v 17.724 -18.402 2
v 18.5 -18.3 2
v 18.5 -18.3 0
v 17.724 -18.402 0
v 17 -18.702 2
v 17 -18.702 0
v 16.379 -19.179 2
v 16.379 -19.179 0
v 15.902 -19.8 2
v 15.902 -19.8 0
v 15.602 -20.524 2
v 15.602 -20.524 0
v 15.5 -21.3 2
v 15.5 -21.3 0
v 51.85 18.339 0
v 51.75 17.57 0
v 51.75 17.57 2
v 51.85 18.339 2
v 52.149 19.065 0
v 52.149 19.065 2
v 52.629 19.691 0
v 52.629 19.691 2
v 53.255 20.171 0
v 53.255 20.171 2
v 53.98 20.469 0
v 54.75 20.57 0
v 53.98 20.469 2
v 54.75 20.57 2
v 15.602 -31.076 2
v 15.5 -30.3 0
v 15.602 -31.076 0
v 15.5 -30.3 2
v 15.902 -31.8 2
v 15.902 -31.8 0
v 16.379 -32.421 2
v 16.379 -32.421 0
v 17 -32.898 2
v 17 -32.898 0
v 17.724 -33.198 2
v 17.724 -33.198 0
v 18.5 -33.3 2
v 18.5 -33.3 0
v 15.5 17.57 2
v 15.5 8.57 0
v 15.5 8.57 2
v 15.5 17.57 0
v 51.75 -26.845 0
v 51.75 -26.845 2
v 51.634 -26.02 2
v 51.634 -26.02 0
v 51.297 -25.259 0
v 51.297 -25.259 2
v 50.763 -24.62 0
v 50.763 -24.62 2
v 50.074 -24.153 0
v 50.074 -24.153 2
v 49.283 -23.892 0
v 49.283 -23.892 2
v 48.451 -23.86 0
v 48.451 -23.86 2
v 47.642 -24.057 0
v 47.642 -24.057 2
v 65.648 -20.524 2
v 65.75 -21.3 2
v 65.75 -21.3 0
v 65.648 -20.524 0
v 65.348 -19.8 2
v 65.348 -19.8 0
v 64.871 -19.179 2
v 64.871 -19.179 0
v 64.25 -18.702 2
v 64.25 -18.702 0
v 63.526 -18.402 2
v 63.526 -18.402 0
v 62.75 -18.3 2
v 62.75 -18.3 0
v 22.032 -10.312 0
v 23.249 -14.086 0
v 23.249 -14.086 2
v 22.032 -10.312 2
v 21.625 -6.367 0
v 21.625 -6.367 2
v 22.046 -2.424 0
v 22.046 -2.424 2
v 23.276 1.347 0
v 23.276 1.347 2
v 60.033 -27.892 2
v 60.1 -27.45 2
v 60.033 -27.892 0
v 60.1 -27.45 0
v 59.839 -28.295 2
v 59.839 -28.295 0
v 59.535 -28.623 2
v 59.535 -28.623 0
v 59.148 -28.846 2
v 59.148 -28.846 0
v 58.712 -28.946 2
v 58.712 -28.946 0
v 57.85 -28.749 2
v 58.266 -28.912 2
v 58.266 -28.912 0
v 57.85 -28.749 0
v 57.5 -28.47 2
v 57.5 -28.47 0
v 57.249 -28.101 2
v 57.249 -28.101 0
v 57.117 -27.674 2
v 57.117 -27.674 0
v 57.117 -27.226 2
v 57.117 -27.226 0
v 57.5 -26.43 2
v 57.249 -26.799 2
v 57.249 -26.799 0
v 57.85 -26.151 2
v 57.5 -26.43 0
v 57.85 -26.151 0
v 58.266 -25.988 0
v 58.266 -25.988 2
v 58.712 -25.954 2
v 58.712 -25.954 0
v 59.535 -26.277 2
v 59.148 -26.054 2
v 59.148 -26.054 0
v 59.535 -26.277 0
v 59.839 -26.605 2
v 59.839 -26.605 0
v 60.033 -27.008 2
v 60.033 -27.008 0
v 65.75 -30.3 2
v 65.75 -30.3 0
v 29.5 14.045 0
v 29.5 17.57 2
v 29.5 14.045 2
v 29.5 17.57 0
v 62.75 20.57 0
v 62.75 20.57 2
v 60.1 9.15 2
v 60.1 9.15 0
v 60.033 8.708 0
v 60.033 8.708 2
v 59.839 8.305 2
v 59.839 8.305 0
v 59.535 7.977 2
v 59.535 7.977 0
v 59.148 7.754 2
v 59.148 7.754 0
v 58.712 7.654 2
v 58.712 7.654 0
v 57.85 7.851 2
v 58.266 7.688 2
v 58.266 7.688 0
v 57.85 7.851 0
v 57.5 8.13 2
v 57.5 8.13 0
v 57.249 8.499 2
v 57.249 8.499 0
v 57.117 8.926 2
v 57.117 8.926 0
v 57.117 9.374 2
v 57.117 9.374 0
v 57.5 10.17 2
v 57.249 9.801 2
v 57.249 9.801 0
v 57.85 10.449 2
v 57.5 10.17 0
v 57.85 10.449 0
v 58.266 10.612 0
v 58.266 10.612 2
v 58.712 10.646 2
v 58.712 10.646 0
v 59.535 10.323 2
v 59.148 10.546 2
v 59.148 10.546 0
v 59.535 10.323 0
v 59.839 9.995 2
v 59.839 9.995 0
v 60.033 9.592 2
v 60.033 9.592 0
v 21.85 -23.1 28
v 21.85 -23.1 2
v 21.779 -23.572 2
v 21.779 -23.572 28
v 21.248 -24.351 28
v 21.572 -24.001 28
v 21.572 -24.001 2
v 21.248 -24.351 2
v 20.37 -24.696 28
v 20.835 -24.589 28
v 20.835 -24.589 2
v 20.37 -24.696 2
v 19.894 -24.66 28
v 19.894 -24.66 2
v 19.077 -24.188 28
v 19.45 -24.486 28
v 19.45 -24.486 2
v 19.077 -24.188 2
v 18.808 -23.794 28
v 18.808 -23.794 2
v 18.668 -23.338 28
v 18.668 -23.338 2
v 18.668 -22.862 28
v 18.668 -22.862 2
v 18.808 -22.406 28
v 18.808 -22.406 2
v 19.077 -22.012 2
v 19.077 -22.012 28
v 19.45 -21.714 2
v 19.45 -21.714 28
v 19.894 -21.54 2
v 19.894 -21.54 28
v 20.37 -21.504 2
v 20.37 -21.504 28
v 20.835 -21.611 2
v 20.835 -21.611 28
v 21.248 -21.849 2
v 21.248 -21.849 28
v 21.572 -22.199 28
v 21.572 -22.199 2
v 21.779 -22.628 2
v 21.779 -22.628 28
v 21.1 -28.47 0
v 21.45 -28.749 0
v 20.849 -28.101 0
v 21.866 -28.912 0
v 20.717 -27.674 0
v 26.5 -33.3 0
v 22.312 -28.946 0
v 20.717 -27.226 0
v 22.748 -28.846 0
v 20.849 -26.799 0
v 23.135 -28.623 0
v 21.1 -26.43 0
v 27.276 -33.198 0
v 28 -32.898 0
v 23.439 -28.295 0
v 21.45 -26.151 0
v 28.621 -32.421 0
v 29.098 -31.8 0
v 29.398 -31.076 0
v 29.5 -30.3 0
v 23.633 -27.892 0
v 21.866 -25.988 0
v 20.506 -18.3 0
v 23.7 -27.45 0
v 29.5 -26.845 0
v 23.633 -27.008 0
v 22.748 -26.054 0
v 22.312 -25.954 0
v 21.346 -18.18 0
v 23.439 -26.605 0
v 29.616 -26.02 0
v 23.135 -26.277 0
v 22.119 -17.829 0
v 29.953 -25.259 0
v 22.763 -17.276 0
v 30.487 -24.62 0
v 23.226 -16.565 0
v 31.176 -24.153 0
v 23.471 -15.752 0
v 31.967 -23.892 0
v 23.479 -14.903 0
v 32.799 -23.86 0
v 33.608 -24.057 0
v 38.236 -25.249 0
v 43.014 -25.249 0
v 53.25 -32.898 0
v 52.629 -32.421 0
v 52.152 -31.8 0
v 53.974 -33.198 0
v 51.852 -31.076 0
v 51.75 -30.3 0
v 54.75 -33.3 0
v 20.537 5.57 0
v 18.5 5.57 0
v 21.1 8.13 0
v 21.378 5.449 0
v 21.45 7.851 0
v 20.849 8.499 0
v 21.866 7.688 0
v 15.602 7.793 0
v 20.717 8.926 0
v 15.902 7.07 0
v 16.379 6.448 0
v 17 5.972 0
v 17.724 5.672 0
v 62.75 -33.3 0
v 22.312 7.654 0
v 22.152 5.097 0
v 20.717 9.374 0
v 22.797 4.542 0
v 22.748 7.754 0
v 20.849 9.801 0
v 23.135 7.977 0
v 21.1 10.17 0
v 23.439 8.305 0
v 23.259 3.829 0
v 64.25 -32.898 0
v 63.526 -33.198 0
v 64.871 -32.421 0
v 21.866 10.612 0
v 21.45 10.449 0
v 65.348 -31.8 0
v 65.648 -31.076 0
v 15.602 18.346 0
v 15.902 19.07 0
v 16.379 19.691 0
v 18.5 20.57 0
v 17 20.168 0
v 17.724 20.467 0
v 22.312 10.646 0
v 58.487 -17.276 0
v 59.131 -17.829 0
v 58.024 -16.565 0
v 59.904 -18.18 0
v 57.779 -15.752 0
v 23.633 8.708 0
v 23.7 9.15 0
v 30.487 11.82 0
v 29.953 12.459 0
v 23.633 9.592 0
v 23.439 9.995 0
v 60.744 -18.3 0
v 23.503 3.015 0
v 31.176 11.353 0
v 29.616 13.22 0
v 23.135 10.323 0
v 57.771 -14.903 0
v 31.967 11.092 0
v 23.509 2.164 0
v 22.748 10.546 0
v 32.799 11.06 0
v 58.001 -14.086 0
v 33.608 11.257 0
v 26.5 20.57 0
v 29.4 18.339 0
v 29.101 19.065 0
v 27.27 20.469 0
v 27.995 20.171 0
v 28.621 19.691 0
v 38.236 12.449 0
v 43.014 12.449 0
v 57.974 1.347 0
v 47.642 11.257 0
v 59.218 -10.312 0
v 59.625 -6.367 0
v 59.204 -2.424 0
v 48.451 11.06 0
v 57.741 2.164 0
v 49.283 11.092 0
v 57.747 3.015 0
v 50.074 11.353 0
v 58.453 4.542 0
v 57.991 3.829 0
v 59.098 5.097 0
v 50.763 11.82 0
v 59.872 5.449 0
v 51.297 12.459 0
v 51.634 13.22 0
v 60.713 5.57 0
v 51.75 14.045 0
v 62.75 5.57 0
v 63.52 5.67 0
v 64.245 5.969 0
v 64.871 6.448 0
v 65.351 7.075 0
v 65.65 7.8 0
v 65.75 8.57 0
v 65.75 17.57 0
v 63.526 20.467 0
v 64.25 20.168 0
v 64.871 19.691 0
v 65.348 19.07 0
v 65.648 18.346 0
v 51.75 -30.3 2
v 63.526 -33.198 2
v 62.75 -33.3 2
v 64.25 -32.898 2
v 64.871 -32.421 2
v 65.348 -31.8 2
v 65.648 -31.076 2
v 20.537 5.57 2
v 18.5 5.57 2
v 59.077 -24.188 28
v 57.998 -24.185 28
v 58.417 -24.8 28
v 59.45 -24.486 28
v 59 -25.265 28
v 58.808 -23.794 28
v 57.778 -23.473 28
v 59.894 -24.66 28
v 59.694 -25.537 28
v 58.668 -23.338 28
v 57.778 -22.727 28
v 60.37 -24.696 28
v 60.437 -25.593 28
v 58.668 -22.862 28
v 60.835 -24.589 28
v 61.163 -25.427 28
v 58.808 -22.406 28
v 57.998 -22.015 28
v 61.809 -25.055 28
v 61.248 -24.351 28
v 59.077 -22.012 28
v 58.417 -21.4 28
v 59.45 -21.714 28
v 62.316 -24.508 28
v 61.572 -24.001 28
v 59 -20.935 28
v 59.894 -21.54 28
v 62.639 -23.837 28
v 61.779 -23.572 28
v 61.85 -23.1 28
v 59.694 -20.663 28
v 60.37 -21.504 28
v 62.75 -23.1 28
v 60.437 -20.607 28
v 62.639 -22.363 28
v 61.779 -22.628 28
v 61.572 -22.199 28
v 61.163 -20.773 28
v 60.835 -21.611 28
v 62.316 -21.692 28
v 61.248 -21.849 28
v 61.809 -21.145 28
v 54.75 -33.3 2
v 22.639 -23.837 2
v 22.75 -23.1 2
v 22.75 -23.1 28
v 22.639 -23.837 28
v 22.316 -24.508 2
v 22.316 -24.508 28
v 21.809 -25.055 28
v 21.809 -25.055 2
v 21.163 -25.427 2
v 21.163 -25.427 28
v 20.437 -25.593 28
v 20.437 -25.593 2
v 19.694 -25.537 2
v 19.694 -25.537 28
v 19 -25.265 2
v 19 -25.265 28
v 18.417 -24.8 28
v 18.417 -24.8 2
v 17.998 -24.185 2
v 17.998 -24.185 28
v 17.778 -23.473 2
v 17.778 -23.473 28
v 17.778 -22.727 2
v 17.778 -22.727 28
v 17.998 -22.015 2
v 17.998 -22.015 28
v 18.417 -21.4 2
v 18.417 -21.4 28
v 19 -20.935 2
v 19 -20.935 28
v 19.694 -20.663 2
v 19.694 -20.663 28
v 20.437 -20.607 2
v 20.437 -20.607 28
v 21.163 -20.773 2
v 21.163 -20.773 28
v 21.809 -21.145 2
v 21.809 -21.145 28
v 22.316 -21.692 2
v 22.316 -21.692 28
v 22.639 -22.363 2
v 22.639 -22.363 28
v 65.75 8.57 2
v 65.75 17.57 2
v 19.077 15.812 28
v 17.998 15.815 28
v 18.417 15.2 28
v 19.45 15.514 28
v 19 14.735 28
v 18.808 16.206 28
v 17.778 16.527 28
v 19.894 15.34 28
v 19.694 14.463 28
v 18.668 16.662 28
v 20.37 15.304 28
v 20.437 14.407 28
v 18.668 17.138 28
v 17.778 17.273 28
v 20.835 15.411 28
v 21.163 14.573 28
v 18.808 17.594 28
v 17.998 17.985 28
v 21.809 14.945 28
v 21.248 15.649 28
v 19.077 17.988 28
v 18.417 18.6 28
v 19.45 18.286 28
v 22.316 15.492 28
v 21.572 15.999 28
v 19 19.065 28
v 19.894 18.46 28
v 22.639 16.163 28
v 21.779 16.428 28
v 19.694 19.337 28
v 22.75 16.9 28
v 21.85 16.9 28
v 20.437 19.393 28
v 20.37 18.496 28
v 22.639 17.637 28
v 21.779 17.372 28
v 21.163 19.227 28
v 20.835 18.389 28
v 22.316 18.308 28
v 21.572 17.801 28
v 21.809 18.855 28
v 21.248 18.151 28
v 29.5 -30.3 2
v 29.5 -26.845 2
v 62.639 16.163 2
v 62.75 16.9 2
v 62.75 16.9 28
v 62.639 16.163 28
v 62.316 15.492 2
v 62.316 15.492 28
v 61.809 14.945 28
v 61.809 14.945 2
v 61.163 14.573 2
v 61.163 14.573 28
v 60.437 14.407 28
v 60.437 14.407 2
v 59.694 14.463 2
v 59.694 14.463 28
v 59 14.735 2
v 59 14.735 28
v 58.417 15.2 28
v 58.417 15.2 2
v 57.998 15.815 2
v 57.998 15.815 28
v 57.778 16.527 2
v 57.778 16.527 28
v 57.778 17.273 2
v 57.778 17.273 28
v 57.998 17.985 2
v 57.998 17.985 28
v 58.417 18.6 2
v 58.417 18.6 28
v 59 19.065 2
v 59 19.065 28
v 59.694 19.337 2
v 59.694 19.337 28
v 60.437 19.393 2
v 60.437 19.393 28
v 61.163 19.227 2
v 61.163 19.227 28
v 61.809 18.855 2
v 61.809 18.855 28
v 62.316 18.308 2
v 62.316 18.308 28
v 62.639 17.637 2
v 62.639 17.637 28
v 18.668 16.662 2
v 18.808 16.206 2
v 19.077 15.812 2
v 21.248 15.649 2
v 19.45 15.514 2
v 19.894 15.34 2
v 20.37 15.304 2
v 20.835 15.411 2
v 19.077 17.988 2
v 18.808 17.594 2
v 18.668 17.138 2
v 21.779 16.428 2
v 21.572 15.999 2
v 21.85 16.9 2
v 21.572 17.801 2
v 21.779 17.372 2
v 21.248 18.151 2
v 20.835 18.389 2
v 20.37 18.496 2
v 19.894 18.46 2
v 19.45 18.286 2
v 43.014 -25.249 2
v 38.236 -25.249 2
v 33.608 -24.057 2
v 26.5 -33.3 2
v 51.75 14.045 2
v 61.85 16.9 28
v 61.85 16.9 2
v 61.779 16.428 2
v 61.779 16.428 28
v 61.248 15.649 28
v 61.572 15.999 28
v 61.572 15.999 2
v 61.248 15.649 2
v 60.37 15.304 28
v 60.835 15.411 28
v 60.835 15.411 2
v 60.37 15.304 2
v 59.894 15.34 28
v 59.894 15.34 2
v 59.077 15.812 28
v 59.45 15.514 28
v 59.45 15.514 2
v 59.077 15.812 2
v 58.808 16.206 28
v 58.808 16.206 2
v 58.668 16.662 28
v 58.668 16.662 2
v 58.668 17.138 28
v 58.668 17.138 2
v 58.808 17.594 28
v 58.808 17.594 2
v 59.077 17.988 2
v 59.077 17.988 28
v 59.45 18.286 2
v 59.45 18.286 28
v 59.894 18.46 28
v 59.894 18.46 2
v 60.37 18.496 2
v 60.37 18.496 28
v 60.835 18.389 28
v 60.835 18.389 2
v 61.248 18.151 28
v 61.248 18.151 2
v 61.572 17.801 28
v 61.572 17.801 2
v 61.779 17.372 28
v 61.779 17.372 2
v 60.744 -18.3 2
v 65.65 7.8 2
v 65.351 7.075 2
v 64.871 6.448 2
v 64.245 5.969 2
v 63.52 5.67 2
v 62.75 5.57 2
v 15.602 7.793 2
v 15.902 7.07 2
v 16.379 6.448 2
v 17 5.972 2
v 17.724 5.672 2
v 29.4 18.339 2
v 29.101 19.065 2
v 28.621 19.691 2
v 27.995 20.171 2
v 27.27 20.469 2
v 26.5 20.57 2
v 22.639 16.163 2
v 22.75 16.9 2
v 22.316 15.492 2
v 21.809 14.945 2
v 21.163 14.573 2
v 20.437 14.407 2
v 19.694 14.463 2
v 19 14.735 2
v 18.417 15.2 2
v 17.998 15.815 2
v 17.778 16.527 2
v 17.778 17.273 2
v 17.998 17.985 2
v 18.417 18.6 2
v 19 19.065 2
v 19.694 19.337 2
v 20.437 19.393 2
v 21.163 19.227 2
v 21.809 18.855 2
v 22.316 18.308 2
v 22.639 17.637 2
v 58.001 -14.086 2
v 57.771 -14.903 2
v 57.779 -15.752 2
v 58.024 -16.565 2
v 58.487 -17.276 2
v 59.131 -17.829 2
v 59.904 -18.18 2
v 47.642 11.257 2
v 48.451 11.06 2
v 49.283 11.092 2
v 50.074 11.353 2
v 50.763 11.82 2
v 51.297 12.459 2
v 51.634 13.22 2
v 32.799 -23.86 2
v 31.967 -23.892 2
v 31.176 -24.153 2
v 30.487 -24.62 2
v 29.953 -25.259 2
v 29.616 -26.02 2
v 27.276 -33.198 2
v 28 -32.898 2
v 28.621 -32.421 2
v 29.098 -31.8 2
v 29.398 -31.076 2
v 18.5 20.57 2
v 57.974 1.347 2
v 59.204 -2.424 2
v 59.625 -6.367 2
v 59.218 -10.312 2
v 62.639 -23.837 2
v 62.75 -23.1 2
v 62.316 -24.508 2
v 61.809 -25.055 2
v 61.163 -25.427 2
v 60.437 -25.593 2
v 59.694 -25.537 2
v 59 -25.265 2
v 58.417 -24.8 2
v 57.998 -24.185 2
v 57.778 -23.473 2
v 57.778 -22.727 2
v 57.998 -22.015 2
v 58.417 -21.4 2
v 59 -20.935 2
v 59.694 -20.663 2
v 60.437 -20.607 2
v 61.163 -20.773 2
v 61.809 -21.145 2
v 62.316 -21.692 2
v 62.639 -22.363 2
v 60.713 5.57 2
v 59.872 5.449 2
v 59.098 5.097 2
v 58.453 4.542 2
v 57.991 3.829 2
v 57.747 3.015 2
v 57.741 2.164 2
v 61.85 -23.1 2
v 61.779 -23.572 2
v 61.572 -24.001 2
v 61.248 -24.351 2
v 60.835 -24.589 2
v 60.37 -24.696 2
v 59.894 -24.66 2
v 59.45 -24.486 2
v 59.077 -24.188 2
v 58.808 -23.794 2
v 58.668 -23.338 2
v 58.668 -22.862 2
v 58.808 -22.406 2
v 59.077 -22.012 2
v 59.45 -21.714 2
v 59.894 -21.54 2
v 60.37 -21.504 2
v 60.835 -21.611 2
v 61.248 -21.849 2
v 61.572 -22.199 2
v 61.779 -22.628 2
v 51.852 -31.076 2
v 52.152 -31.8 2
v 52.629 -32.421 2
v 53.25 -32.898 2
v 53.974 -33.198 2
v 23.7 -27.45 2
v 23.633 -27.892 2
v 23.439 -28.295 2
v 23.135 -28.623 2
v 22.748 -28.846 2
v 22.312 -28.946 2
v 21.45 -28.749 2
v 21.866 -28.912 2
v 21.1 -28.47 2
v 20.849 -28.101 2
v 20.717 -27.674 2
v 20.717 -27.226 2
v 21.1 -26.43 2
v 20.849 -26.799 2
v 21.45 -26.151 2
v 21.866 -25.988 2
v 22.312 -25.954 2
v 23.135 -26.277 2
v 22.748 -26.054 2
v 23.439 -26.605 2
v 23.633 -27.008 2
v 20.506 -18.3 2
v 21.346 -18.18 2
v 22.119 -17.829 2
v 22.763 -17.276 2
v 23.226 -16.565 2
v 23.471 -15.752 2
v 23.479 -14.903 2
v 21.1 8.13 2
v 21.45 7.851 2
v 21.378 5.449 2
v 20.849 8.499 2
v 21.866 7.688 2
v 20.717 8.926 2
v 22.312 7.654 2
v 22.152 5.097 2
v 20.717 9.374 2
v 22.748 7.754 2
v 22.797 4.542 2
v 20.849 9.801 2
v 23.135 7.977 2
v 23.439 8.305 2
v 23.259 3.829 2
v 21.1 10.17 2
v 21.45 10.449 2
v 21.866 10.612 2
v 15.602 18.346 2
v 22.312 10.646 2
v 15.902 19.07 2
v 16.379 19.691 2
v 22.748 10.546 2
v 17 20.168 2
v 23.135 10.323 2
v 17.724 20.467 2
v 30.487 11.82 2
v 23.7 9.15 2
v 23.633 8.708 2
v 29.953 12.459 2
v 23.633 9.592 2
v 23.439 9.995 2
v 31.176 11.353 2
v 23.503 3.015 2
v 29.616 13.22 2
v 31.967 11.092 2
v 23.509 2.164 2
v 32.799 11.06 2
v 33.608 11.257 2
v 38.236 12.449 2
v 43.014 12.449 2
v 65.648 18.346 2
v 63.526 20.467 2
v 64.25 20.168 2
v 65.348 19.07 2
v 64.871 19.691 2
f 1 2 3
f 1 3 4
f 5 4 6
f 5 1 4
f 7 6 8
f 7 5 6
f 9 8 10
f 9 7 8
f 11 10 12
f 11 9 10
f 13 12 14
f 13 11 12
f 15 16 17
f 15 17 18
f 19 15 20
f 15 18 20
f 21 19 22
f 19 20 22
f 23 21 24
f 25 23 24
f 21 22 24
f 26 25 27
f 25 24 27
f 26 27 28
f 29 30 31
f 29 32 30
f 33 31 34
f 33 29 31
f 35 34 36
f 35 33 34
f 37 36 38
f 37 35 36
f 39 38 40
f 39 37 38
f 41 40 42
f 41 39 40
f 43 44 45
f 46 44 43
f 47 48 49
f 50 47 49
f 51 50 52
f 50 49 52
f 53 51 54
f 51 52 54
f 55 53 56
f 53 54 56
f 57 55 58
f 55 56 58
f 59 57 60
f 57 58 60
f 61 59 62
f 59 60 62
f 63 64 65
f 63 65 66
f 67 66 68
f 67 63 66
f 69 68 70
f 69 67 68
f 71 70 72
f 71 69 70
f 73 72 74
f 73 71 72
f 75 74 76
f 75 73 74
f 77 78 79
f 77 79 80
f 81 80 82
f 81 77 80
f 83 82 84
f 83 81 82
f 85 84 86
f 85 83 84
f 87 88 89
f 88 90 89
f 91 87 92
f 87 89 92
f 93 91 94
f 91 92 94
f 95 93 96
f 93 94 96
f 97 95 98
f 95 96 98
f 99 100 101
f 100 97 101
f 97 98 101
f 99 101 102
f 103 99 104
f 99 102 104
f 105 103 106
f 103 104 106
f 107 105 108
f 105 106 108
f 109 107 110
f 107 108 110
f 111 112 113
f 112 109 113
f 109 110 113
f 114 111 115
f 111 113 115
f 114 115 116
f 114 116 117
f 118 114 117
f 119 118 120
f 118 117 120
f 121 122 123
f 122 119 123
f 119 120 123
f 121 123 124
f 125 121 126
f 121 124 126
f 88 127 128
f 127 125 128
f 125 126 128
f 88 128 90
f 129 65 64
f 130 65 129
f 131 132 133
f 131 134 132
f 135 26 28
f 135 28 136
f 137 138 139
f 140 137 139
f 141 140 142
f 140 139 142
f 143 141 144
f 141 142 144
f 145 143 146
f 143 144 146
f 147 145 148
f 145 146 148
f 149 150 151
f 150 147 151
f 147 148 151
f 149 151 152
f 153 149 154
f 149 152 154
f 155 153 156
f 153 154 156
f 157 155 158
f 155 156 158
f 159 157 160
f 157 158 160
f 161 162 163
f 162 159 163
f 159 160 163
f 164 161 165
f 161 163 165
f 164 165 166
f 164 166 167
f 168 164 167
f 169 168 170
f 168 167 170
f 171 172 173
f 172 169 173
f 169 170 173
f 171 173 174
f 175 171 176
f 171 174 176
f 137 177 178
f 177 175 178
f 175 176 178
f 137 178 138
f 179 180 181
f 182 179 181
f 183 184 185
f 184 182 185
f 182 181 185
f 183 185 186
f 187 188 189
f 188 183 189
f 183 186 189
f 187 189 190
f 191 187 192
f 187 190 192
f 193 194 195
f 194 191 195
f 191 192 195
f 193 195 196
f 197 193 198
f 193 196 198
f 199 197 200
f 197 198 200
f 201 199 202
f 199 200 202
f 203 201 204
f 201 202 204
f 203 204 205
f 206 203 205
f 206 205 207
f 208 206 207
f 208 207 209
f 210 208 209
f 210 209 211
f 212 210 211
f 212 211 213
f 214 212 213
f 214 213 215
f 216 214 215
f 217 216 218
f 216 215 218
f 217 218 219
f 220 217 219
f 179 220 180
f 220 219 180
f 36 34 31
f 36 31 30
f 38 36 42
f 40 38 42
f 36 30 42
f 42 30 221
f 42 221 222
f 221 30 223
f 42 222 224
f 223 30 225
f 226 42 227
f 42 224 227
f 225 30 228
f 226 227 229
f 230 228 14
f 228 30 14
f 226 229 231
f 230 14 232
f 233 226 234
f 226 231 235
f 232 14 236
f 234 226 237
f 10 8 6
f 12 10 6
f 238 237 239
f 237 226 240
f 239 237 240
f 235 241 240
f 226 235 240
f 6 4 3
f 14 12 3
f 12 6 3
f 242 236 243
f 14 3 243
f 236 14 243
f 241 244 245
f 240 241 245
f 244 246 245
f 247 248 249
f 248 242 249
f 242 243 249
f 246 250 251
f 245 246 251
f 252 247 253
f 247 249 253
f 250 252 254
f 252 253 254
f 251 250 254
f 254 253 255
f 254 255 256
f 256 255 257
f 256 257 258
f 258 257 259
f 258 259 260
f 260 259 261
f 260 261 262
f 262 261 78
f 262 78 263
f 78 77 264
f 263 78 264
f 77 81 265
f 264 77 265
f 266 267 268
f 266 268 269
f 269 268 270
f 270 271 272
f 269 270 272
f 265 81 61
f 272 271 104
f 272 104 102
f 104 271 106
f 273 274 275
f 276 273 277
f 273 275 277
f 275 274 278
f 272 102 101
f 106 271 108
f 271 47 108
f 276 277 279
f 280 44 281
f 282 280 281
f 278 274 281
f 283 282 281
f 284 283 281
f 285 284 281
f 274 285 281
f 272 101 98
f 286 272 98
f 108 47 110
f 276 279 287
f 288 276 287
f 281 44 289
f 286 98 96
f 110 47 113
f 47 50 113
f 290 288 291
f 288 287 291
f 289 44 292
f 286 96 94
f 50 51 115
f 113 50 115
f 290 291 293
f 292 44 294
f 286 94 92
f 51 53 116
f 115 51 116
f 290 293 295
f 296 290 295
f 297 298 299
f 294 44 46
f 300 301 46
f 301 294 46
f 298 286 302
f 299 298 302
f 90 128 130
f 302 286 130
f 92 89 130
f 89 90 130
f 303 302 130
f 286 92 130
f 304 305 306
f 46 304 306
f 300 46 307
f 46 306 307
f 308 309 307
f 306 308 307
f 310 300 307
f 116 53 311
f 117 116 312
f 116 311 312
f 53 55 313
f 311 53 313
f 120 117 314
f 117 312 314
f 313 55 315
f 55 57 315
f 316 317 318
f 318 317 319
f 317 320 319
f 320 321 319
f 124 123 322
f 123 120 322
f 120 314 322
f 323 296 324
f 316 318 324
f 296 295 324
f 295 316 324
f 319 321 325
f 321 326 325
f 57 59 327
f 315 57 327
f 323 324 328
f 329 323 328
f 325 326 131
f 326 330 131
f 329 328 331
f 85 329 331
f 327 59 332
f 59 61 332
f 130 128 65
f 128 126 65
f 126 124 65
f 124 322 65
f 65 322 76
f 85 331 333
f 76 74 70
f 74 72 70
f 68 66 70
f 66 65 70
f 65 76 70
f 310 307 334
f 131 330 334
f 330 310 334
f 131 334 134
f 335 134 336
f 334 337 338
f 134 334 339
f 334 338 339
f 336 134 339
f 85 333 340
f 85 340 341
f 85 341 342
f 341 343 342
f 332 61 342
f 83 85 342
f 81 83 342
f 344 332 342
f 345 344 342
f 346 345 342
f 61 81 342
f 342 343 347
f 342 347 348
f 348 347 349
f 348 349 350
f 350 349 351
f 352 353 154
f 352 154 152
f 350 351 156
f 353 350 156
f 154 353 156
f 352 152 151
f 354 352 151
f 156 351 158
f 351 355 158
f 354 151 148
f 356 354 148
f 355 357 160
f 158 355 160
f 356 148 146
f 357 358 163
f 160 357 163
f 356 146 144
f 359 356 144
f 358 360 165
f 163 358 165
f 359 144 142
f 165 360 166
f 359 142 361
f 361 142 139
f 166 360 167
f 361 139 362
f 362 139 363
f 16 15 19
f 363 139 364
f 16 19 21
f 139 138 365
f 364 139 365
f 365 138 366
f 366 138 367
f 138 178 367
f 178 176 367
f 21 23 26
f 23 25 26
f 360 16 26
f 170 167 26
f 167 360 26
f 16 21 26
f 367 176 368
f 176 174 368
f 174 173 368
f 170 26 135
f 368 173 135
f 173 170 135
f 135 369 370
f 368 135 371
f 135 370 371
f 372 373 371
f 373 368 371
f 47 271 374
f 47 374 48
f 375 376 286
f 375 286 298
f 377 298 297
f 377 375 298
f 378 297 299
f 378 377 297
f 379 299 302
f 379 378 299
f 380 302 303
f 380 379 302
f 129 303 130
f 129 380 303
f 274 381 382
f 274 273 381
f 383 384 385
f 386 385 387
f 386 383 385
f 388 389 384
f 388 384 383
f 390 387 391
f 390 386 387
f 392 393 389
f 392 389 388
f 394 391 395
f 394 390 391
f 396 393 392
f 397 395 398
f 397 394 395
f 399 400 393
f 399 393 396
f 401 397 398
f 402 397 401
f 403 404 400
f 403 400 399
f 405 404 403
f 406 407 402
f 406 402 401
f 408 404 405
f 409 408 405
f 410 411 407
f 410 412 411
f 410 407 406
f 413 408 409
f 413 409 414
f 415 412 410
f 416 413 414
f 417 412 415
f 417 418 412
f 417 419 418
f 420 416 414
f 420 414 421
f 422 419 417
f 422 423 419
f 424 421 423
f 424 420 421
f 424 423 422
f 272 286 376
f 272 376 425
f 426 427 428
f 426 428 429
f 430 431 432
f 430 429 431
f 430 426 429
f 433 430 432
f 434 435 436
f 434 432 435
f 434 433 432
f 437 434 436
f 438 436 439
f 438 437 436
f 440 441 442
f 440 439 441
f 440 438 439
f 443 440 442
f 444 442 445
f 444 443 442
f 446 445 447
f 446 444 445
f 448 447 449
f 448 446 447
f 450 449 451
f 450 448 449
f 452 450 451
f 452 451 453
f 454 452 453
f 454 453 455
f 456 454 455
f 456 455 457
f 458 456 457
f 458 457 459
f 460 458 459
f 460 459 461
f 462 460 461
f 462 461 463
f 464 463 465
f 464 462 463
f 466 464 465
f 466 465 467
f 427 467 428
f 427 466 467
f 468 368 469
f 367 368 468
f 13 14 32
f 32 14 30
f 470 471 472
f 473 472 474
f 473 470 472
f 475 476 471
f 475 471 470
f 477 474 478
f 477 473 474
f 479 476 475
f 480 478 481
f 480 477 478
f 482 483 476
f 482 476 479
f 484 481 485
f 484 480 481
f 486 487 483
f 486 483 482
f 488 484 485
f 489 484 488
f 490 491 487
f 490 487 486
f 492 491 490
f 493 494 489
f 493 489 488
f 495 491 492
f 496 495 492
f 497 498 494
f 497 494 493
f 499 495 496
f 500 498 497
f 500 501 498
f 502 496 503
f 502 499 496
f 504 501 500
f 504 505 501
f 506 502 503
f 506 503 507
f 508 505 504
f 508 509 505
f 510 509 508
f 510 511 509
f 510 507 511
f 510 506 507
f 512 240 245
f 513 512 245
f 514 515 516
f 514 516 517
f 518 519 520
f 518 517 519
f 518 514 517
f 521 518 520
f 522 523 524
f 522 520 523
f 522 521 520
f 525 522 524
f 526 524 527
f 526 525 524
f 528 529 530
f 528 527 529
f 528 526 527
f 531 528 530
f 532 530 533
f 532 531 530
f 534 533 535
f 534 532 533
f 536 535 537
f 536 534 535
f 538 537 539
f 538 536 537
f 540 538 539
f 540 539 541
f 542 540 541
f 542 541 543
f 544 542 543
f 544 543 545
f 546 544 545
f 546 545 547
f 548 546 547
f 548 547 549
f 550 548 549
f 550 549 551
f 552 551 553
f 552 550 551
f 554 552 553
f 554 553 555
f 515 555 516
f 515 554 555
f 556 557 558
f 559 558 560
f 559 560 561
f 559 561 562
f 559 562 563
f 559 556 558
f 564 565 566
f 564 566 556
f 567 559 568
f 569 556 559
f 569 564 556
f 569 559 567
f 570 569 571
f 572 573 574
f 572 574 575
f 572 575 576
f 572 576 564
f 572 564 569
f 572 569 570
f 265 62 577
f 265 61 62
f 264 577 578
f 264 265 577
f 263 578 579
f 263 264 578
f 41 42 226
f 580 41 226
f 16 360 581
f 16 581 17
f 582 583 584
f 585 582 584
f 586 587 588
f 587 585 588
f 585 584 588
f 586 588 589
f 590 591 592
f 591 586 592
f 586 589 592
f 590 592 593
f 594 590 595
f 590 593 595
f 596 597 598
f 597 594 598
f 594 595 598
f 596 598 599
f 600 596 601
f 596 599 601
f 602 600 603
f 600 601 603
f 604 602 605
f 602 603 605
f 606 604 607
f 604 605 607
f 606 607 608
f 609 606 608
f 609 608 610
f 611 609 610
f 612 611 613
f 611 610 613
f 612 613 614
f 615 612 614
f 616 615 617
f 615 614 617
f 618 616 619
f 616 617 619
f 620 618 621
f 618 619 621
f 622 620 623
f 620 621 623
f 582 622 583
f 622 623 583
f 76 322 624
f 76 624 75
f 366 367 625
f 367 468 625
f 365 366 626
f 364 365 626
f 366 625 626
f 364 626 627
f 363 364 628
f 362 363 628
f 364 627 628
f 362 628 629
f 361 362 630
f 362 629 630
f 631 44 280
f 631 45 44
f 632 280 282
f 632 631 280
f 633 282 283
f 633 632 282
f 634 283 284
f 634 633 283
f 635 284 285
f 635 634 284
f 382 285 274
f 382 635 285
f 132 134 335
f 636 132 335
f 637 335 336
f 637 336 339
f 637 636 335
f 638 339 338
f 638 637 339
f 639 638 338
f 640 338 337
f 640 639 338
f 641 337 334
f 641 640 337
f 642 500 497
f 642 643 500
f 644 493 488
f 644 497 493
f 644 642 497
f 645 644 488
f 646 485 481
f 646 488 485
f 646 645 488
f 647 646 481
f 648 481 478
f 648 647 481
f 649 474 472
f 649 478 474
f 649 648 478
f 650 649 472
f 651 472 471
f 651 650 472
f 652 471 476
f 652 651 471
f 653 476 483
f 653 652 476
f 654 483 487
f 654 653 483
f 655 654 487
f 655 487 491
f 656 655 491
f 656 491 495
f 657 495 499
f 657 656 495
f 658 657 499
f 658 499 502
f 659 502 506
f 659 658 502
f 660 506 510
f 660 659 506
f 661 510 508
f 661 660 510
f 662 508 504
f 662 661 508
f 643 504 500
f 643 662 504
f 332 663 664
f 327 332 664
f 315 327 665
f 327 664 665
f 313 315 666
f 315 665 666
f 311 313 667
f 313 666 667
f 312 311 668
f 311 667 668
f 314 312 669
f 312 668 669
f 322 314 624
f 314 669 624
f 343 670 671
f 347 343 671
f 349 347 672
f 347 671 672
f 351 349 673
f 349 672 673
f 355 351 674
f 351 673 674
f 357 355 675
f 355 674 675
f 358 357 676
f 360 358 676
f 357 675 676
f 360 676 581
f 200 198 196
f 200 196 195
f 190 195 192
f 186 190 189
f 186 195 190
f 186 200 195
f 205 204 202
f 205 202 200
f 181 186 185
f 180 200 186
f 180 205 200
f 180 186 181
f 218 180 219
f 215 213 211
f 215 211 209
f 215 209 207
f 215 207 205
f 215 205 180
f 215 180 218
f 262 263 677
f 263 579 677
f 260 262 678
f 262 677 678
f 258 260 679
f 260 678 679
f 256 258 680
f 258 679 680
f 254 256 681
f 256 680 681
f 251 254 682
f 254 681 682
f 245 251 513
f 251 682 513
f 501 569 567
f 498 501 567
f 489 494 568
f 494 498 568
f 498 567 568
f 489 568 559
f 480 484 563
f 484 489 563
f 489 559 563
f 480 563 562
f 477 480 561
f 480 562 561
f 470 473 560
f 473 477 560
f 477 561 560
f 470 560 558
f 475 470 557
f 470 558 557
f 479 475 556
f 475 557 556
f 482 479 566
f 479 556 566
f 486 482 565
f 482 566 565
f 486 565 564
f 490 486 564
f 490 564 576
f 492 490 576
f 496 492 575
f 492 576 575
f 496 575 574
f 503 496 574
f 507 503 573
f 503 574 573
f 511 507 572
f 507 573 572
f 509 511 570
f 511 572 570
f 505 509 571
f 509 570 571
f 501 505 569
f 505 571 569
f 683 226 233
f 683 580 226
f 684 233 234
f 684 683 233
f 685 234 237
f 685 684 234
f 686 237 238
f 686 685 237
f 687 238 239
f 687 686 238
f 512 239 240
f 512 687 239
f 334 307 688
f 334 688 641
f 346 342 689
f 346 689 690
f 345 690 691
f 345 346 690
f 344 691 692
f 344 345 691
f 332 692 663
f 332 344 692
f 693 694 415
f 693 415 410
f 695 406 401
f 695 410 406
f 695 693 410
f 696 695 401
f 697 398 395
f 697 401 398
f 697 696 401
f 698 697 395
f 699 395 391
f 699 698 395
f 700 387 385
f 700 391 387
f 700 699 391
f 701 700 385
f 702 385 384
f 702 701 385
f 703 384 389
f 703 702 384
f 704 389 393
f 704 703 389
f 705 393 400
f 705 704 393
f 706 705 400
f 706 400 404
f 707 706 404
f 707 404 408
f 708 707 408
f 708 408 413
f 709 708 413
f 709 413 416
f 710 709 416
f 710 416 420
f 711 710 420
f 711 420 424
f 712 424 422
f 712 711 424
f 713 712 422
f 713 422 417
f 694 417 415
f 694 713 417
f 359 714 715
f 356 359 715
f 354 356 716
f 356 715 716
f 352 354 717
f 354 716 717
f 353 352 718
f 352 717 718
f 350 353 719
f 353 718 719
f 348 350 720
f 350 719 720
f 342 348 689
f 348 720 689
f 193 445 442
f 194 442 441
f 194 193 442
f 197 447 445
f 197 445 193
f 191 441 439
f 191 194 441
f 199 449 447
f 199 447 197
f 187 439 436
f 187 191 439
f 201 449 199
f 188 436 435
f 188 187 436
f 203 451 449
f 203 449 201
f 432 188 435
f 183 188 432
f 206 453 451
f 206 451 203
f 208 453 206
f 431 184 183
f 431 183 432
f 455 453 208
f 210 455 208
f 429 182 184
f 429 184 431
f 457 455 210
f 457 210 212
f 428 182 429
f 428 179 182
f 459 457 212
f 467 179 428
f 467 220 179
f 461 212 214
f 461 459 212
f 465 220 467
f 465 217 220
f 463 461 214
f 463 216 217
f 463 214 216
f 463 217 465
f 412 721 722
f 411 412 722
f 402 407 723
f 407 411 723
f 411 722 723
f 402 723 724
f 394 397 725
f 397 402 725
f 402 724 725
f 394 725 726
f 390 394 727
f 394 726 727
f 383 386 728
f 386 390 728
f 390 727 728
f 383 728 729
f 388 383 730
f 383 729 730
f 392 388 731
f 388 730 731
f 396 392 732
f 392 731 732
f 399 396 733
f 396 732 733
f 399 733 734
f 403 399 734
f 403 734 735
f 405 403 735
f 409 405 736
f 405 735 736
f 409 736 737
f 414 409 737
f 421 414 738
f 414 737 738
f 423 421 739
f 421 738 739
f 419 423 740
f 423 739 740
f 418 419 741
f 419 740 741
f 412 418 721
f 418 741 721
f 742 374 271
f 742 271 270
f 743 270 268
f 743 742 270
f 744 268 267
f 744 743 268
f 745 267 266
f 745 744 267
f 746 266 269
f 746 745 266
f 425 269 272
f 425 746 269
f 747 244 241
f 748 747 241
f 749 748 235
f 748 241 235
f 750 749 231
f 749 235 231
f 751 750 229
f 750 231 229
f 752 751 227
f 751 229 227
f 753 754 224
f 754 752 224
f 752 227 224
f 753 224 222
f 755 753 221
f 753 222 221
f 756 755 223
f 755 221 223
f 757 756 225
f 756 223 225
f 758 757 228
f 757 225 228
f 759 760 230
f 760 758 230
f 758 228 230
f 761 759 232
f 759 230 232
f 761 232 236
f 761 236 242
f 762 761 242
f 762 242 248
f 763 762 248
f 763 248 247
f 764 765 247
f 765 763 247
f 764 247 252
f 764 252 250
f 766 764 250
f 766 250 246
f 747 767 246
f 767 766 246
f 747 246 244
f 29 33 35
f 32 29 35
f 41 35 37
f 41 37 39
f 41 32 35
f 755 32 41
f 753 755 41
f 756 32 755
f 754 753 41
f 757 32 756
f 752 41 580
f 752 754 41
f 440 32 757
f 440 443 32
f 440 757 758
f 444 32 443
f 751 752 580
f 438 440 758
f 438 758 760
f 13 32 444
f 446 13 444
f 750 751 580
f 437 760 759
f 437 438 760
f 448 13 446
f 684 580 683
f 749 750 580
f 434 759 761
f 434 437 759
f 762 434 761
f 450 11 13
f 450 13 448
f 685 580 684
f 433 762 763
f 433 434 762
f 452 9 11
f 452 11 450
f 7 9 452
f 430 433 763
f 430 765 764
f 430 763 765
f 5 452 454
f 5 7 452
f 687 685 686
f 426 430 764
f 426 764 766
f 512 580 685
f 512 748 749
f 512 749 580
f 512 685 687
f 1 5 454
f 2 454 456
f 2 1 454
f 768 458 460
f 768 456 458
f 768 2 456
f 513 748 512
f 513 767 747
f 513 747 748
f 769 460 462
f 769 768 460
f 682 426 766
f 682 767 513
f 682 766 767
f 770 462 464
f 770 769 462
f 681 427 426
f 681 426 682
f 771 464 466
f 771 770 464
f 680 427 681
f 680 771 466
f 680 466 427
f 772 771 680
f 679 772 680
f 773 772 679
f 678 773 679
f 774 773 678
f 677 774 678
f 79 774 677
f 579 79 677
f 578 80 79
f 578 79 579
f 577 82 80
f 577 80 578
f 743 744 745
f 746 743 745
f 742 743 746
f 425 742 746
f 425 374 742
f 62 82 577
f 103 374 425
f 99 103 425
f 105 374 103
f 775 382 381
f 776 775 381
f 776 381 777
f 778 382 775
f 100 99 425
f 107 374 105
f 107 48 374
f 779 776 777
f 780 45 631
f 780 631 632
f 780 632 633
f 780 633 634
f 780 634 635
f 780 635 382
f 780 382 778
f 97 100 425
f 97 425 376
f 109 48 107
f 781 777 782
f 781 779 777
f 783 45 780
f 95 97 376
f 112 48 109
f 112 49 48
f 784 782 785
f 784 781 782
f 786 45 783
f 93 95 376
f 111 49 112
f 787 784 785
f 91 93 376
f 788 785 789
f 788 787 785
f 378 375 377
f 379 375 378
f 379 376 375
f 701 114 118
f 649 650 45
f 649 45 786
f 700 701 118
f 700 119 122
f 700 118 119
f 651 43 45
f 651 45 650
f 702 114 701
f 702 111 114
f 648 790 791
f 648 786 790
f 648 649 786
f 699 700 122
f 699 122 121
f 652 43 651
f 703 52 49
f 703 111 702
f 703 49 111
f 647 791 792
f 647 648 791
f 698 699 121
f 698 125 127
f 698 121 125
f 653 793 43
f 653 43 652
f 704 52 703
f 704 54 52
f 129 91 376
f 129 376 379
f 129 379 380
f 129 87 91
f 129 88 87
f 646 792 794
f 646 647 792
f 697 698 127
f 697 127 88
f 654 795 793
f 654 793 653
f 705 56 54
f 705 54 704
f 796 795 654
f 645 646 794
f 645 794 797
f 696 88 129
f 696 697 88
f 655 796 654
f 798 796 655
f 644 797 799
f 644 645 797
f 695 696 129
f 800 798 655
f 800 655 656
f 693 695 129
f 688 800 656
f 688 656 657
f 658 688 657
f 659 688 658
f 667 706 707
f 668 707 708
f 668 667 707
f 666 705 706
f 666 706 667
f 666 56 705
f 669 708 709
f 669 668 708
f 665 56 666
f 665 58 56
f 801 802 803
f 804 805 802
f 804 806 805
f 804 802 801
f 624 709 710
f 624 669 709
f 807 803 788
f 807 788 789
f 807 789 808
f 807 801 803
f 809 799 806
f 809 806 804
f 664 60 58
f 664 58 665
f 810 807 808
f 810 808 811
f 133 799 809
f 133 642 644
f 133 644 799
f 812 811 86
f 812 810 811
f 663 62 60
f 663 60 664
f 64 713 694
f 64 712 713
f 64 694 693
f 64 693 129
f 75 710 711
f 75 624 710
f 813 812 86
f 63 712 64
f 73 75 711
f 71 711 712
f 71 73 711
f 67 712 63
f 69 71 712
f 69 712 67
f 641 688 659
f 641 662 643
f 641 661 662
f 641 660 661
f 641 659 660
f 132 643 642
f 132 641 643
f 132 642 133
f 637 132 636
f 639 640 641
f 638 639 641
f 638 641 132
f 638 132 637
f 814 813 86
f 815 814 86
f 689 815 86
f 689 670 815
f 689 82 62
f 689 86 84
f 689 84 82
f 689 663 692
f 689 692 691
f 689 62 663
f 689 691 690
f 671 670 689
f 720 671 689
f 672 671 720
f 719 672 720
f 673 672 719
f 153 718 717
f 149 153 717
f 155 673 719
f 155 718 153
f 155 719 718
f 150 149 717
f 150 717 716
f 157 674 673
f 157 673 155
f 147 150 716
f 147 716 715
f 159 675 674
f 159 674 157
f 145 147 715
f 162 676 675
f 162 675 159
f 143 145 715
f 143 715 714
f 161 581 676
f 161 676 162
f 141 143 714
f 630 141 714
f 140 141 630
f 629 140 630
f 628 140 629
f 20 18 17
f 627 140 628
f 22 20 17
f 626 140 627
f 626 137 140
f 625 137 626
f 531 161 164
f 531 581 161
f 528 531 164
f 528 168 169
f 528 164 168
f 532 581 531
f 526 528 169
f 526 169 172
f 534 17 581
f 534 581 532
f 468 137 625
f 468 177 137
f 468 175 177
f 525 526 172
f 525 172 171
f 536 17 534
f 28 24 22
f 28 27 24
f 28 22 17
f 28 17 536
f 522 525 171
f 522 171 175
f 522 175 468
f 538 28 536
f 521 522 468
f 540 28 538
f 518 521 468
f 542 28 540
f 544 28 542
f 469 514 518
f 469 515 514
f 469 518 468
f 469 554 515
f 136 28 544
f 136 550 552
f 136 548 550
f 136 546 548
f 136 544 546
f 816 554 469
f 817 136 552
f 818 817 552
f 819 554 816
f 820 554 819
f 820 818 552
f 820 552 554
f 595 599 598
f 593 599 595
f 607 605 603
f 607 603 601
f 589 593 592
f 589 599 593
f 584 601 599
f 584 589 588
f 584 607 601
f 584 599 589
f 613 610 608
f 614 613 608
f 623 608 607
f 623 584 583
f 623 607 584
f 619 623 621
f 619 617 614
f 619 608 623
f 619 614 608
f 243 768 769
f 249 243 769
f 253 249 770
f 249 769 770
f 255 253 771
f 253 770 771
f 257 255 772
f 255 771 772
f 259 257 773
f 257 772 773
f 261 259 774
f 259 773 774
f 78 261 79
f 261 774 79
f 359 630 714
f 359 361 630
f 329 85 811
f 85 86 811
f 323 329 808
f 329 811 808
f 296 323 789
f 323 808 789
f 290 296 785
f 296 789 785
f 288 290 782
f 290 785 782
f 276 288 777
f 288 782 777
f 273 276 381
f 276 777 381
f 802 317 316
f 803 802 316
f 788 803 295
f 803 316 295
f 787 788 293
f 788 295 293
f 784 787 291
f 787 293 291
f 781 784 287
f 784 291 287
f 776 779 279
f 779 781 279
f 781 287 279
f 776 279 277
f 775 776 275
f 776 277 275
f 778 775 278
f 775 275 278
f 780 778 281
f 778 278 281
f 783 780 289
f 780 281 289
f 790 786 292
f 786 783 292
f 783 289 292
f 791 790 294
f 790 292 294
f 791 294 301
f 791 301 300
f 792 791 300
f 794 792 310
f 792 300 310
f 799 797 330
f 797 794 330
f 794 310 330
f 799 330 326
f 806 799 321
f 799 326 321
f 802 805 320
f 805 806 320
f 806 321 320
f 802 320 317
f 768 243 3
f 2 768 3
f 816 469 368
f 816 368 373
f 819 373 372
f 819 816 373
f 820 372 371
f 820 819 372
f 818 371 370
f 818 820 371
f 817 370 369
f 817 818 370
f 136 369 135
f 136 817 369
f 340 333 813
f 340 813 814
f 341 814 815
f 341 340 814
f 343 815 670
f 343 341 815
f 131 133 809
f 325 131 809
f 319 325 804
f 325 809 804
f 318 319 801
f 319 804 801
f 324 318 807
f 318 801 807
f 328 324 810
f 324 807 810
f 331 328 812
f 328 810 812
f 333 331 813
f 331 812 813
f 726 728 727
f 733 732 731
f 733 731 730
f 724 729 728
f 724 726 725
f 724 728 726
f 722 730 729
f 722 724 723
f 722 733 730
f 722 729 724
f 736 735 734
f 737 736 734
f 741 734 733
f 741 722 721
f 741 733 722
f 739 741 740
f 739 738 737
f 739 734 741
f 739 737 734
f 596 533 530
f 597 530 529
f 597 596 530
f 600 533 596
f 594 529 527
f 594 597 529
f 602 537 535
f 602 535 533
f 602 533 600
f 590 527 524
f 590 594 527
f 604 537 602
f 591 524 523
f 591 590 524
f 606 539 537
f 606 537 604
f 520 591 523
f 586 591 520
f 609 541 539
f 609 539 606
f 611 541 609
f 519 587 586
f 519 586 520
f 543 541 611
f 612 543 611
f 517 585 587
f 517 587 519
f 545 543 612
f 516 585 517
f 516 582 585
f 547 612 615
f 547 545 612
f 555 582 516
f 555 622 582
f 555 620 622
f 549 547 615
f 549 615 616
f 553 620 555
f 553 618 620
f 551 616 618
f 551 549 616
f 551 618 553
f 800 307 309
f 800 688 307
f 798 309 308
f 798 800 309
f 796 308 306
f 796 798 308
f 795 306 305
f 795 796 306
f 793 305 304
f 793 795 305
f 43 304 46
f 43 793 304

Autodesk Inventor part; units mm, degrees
ref_plane "YZ Plane" through (0, 0, 0) normal (1, 0, 0) x (0, 1, 0)
ref_plane "XZ Plane" through (0, 0, 0) normal (0, 1, 0) x (-1, 0, 0)
ref_plane "Work Plane1" through (0, 0, 0) normal (0, 0, 1) x (1, 0, 0)
sketch "Sketch1" plane through (0, 0, 0) normal (0, 0, 1) x (1, 0, 0)
  circle A0 centre (22.2, -27.45) radius 1.5 projected
  circle A1 centre (58.6, -27.45) radius 1.5 projected
  circle A2 centre (22.2, 9.15) radius 1.5 projected
  circle A3 centre (58.6, 9.15) radius 1.5 projected
  line L0 (15.5, 16.5) -> (15.5, -25.3) projected
  line L1 (19.5, -29.3) -> (61, -29.3) projected
  line L2 (61, 20.5) -> (19.5, 20.5) projected
  line L3 (64.8607, 14) -> (64.8607, -18) projected
  line L4 (65.75, -18) -> (65.75, 14) projected
  line L5 (65.75, -33.3) -> (51.75, -33.3)
  line L6 (51.75, -33.3) -> (51.75, -21.8024)
  line L7 (55.4368, -18.3) -> (65.75, -18.3)
  line L8 (65.75, -18.3) -> (65.75, -33.3)
  line L9 (15.5, -33.3) -> (29.5, -33.3)
  line L10 (29.5, -33.3) -> (29.5, -21.8024)
  line L11 (25.8132, -18.3) -> (15.5, -18.3)
  line L12 (15.5, -18.3) -> (15.5, -33.3)
  line L13 (15.5, 20.5697) -> (29.5, 20.5697)
  line L14 (29.5, 20.5697) -> (29.5, 9.0024)
  line L15 (25.8695, 5.5697) -> (15.5, 5.5697)
  line L16 (15.5, 5.5697) -> (15.5, 20.5697)
  line L17 (51.75, 20.5697) -> (65.75, 20.5697)
  line L18 (65.75, 20.5697) -> (65.75, 5.5697)
  line L19 (65.75, 5.5697) -> (55.3805, 5.5697)
  line L20 (51.75, 9.0024) -> (51.75, 20.5697)
  arc A4 (51.75, 9.0024) -> (29.5, 9.0024) centre (40.625, -6.4) ccw
  arc A5 (25.8695, 5.5697) -> (25.8132, -18.3) centre (40.625, -6.4) ccw
  arc A6 (29.5, -21.8024) -> (51.75, -21.8024) centre (40.625, -6.4) ccw
  arc A7 (55.4368, -18.3) -> (55.3805, 5.5697) centre (40.625, -6.4) ccw
  line L21 (65.75, 20.5697) -> (65.75, 5.5697)
  line L22 (65.75, -18.3) -> (65.75, -33.3)
  line L23 (15.5, 20.5697) -> (29.5, 20.5697)
  line L24 (51.75, 20.5697) -> (65.75, 20.5697)
  line L25 (15.5, -33.3) -> (15.5, -18.3)
  line L26 (15.5, 5.5697) -> (15.5, 20.5697)
  point P0 (0, 0)
  point P1 (40.25, 20.5)
  dimension "d10" = 50.25
  dimension "d13" = 26.9
extrude "Extrusion1" add sketch "Sketch1" along normal blind 2 contours L16 L13 L14 A4 L20 L17 L18 L4 L19 A7 L7 L8 L5 L6 A6 L10 L9 L12 L0 L11 A5 L15
fillet "Fillet1" radius 3 7 edges at (55.3805, 5.5697, 1) (29.5, -21.8024, 1) (25.8132, -18.3, 1) (29.5, 9.0024, 1) (55.4368, -18.3, 1) (25.8695, 5.5697, 1) (51.75, -21.8024, 1)
fillet "Fillet2" radius 3 12 edges at (15.5, 20.5697, 1) (15.5, 5.5697, 1) (29.5, 20.5697, 1) (51.75, 20.5697, 1) (65.75, 20.5697, 1) (65.75, -18.3, 1) (51.75, -33.3, 1) (15.5, -18.3, 1) (15.5, -33.3, 1) (29.5, -33.3, 1) (65.75, -33.3, 1) (65.75, 5.5697, 1)
sketch "Sketch2" plane through (0, 0, 2) normal (0, 0, 1) x (1, 0, 0)
  circle A0 centre (60.25, -23.1) radius 1.6 projected
  circle A1 centre (20.25, -23.1) radius 1.6 projected
  circle A2 centre (20.25, 16.9) radius 1.6 projected
  circle A3 centre (60.25, 16.9) radius 1.6 projected
  circle A4 centre (20.25, -23.1) radius 2.5
  circle A5 centre (60.25, 16.9) radius 2.5
  circle A6 centre (20.25, 16.9) radius 2.5
  circle A7 centre (60.25, -23.1) radius 2.5
  point P0 (0, 0)
  dimension "d17" = 5
  dimension "d18" = 5
  dimension "d19" = 5
  dimension "d20" = 5
extrude "Extrusion2" add sketch "Sketch2" along normal blind 26
fillet "Fillet3" radius 3 1 edges at (51.75, 9.0024, 1)
equation "\"d13\" = 0.5 * d11"
equation "\"d11\" = 53.8"
properties part number "soporteHBridge" material "ABS Plastic"
